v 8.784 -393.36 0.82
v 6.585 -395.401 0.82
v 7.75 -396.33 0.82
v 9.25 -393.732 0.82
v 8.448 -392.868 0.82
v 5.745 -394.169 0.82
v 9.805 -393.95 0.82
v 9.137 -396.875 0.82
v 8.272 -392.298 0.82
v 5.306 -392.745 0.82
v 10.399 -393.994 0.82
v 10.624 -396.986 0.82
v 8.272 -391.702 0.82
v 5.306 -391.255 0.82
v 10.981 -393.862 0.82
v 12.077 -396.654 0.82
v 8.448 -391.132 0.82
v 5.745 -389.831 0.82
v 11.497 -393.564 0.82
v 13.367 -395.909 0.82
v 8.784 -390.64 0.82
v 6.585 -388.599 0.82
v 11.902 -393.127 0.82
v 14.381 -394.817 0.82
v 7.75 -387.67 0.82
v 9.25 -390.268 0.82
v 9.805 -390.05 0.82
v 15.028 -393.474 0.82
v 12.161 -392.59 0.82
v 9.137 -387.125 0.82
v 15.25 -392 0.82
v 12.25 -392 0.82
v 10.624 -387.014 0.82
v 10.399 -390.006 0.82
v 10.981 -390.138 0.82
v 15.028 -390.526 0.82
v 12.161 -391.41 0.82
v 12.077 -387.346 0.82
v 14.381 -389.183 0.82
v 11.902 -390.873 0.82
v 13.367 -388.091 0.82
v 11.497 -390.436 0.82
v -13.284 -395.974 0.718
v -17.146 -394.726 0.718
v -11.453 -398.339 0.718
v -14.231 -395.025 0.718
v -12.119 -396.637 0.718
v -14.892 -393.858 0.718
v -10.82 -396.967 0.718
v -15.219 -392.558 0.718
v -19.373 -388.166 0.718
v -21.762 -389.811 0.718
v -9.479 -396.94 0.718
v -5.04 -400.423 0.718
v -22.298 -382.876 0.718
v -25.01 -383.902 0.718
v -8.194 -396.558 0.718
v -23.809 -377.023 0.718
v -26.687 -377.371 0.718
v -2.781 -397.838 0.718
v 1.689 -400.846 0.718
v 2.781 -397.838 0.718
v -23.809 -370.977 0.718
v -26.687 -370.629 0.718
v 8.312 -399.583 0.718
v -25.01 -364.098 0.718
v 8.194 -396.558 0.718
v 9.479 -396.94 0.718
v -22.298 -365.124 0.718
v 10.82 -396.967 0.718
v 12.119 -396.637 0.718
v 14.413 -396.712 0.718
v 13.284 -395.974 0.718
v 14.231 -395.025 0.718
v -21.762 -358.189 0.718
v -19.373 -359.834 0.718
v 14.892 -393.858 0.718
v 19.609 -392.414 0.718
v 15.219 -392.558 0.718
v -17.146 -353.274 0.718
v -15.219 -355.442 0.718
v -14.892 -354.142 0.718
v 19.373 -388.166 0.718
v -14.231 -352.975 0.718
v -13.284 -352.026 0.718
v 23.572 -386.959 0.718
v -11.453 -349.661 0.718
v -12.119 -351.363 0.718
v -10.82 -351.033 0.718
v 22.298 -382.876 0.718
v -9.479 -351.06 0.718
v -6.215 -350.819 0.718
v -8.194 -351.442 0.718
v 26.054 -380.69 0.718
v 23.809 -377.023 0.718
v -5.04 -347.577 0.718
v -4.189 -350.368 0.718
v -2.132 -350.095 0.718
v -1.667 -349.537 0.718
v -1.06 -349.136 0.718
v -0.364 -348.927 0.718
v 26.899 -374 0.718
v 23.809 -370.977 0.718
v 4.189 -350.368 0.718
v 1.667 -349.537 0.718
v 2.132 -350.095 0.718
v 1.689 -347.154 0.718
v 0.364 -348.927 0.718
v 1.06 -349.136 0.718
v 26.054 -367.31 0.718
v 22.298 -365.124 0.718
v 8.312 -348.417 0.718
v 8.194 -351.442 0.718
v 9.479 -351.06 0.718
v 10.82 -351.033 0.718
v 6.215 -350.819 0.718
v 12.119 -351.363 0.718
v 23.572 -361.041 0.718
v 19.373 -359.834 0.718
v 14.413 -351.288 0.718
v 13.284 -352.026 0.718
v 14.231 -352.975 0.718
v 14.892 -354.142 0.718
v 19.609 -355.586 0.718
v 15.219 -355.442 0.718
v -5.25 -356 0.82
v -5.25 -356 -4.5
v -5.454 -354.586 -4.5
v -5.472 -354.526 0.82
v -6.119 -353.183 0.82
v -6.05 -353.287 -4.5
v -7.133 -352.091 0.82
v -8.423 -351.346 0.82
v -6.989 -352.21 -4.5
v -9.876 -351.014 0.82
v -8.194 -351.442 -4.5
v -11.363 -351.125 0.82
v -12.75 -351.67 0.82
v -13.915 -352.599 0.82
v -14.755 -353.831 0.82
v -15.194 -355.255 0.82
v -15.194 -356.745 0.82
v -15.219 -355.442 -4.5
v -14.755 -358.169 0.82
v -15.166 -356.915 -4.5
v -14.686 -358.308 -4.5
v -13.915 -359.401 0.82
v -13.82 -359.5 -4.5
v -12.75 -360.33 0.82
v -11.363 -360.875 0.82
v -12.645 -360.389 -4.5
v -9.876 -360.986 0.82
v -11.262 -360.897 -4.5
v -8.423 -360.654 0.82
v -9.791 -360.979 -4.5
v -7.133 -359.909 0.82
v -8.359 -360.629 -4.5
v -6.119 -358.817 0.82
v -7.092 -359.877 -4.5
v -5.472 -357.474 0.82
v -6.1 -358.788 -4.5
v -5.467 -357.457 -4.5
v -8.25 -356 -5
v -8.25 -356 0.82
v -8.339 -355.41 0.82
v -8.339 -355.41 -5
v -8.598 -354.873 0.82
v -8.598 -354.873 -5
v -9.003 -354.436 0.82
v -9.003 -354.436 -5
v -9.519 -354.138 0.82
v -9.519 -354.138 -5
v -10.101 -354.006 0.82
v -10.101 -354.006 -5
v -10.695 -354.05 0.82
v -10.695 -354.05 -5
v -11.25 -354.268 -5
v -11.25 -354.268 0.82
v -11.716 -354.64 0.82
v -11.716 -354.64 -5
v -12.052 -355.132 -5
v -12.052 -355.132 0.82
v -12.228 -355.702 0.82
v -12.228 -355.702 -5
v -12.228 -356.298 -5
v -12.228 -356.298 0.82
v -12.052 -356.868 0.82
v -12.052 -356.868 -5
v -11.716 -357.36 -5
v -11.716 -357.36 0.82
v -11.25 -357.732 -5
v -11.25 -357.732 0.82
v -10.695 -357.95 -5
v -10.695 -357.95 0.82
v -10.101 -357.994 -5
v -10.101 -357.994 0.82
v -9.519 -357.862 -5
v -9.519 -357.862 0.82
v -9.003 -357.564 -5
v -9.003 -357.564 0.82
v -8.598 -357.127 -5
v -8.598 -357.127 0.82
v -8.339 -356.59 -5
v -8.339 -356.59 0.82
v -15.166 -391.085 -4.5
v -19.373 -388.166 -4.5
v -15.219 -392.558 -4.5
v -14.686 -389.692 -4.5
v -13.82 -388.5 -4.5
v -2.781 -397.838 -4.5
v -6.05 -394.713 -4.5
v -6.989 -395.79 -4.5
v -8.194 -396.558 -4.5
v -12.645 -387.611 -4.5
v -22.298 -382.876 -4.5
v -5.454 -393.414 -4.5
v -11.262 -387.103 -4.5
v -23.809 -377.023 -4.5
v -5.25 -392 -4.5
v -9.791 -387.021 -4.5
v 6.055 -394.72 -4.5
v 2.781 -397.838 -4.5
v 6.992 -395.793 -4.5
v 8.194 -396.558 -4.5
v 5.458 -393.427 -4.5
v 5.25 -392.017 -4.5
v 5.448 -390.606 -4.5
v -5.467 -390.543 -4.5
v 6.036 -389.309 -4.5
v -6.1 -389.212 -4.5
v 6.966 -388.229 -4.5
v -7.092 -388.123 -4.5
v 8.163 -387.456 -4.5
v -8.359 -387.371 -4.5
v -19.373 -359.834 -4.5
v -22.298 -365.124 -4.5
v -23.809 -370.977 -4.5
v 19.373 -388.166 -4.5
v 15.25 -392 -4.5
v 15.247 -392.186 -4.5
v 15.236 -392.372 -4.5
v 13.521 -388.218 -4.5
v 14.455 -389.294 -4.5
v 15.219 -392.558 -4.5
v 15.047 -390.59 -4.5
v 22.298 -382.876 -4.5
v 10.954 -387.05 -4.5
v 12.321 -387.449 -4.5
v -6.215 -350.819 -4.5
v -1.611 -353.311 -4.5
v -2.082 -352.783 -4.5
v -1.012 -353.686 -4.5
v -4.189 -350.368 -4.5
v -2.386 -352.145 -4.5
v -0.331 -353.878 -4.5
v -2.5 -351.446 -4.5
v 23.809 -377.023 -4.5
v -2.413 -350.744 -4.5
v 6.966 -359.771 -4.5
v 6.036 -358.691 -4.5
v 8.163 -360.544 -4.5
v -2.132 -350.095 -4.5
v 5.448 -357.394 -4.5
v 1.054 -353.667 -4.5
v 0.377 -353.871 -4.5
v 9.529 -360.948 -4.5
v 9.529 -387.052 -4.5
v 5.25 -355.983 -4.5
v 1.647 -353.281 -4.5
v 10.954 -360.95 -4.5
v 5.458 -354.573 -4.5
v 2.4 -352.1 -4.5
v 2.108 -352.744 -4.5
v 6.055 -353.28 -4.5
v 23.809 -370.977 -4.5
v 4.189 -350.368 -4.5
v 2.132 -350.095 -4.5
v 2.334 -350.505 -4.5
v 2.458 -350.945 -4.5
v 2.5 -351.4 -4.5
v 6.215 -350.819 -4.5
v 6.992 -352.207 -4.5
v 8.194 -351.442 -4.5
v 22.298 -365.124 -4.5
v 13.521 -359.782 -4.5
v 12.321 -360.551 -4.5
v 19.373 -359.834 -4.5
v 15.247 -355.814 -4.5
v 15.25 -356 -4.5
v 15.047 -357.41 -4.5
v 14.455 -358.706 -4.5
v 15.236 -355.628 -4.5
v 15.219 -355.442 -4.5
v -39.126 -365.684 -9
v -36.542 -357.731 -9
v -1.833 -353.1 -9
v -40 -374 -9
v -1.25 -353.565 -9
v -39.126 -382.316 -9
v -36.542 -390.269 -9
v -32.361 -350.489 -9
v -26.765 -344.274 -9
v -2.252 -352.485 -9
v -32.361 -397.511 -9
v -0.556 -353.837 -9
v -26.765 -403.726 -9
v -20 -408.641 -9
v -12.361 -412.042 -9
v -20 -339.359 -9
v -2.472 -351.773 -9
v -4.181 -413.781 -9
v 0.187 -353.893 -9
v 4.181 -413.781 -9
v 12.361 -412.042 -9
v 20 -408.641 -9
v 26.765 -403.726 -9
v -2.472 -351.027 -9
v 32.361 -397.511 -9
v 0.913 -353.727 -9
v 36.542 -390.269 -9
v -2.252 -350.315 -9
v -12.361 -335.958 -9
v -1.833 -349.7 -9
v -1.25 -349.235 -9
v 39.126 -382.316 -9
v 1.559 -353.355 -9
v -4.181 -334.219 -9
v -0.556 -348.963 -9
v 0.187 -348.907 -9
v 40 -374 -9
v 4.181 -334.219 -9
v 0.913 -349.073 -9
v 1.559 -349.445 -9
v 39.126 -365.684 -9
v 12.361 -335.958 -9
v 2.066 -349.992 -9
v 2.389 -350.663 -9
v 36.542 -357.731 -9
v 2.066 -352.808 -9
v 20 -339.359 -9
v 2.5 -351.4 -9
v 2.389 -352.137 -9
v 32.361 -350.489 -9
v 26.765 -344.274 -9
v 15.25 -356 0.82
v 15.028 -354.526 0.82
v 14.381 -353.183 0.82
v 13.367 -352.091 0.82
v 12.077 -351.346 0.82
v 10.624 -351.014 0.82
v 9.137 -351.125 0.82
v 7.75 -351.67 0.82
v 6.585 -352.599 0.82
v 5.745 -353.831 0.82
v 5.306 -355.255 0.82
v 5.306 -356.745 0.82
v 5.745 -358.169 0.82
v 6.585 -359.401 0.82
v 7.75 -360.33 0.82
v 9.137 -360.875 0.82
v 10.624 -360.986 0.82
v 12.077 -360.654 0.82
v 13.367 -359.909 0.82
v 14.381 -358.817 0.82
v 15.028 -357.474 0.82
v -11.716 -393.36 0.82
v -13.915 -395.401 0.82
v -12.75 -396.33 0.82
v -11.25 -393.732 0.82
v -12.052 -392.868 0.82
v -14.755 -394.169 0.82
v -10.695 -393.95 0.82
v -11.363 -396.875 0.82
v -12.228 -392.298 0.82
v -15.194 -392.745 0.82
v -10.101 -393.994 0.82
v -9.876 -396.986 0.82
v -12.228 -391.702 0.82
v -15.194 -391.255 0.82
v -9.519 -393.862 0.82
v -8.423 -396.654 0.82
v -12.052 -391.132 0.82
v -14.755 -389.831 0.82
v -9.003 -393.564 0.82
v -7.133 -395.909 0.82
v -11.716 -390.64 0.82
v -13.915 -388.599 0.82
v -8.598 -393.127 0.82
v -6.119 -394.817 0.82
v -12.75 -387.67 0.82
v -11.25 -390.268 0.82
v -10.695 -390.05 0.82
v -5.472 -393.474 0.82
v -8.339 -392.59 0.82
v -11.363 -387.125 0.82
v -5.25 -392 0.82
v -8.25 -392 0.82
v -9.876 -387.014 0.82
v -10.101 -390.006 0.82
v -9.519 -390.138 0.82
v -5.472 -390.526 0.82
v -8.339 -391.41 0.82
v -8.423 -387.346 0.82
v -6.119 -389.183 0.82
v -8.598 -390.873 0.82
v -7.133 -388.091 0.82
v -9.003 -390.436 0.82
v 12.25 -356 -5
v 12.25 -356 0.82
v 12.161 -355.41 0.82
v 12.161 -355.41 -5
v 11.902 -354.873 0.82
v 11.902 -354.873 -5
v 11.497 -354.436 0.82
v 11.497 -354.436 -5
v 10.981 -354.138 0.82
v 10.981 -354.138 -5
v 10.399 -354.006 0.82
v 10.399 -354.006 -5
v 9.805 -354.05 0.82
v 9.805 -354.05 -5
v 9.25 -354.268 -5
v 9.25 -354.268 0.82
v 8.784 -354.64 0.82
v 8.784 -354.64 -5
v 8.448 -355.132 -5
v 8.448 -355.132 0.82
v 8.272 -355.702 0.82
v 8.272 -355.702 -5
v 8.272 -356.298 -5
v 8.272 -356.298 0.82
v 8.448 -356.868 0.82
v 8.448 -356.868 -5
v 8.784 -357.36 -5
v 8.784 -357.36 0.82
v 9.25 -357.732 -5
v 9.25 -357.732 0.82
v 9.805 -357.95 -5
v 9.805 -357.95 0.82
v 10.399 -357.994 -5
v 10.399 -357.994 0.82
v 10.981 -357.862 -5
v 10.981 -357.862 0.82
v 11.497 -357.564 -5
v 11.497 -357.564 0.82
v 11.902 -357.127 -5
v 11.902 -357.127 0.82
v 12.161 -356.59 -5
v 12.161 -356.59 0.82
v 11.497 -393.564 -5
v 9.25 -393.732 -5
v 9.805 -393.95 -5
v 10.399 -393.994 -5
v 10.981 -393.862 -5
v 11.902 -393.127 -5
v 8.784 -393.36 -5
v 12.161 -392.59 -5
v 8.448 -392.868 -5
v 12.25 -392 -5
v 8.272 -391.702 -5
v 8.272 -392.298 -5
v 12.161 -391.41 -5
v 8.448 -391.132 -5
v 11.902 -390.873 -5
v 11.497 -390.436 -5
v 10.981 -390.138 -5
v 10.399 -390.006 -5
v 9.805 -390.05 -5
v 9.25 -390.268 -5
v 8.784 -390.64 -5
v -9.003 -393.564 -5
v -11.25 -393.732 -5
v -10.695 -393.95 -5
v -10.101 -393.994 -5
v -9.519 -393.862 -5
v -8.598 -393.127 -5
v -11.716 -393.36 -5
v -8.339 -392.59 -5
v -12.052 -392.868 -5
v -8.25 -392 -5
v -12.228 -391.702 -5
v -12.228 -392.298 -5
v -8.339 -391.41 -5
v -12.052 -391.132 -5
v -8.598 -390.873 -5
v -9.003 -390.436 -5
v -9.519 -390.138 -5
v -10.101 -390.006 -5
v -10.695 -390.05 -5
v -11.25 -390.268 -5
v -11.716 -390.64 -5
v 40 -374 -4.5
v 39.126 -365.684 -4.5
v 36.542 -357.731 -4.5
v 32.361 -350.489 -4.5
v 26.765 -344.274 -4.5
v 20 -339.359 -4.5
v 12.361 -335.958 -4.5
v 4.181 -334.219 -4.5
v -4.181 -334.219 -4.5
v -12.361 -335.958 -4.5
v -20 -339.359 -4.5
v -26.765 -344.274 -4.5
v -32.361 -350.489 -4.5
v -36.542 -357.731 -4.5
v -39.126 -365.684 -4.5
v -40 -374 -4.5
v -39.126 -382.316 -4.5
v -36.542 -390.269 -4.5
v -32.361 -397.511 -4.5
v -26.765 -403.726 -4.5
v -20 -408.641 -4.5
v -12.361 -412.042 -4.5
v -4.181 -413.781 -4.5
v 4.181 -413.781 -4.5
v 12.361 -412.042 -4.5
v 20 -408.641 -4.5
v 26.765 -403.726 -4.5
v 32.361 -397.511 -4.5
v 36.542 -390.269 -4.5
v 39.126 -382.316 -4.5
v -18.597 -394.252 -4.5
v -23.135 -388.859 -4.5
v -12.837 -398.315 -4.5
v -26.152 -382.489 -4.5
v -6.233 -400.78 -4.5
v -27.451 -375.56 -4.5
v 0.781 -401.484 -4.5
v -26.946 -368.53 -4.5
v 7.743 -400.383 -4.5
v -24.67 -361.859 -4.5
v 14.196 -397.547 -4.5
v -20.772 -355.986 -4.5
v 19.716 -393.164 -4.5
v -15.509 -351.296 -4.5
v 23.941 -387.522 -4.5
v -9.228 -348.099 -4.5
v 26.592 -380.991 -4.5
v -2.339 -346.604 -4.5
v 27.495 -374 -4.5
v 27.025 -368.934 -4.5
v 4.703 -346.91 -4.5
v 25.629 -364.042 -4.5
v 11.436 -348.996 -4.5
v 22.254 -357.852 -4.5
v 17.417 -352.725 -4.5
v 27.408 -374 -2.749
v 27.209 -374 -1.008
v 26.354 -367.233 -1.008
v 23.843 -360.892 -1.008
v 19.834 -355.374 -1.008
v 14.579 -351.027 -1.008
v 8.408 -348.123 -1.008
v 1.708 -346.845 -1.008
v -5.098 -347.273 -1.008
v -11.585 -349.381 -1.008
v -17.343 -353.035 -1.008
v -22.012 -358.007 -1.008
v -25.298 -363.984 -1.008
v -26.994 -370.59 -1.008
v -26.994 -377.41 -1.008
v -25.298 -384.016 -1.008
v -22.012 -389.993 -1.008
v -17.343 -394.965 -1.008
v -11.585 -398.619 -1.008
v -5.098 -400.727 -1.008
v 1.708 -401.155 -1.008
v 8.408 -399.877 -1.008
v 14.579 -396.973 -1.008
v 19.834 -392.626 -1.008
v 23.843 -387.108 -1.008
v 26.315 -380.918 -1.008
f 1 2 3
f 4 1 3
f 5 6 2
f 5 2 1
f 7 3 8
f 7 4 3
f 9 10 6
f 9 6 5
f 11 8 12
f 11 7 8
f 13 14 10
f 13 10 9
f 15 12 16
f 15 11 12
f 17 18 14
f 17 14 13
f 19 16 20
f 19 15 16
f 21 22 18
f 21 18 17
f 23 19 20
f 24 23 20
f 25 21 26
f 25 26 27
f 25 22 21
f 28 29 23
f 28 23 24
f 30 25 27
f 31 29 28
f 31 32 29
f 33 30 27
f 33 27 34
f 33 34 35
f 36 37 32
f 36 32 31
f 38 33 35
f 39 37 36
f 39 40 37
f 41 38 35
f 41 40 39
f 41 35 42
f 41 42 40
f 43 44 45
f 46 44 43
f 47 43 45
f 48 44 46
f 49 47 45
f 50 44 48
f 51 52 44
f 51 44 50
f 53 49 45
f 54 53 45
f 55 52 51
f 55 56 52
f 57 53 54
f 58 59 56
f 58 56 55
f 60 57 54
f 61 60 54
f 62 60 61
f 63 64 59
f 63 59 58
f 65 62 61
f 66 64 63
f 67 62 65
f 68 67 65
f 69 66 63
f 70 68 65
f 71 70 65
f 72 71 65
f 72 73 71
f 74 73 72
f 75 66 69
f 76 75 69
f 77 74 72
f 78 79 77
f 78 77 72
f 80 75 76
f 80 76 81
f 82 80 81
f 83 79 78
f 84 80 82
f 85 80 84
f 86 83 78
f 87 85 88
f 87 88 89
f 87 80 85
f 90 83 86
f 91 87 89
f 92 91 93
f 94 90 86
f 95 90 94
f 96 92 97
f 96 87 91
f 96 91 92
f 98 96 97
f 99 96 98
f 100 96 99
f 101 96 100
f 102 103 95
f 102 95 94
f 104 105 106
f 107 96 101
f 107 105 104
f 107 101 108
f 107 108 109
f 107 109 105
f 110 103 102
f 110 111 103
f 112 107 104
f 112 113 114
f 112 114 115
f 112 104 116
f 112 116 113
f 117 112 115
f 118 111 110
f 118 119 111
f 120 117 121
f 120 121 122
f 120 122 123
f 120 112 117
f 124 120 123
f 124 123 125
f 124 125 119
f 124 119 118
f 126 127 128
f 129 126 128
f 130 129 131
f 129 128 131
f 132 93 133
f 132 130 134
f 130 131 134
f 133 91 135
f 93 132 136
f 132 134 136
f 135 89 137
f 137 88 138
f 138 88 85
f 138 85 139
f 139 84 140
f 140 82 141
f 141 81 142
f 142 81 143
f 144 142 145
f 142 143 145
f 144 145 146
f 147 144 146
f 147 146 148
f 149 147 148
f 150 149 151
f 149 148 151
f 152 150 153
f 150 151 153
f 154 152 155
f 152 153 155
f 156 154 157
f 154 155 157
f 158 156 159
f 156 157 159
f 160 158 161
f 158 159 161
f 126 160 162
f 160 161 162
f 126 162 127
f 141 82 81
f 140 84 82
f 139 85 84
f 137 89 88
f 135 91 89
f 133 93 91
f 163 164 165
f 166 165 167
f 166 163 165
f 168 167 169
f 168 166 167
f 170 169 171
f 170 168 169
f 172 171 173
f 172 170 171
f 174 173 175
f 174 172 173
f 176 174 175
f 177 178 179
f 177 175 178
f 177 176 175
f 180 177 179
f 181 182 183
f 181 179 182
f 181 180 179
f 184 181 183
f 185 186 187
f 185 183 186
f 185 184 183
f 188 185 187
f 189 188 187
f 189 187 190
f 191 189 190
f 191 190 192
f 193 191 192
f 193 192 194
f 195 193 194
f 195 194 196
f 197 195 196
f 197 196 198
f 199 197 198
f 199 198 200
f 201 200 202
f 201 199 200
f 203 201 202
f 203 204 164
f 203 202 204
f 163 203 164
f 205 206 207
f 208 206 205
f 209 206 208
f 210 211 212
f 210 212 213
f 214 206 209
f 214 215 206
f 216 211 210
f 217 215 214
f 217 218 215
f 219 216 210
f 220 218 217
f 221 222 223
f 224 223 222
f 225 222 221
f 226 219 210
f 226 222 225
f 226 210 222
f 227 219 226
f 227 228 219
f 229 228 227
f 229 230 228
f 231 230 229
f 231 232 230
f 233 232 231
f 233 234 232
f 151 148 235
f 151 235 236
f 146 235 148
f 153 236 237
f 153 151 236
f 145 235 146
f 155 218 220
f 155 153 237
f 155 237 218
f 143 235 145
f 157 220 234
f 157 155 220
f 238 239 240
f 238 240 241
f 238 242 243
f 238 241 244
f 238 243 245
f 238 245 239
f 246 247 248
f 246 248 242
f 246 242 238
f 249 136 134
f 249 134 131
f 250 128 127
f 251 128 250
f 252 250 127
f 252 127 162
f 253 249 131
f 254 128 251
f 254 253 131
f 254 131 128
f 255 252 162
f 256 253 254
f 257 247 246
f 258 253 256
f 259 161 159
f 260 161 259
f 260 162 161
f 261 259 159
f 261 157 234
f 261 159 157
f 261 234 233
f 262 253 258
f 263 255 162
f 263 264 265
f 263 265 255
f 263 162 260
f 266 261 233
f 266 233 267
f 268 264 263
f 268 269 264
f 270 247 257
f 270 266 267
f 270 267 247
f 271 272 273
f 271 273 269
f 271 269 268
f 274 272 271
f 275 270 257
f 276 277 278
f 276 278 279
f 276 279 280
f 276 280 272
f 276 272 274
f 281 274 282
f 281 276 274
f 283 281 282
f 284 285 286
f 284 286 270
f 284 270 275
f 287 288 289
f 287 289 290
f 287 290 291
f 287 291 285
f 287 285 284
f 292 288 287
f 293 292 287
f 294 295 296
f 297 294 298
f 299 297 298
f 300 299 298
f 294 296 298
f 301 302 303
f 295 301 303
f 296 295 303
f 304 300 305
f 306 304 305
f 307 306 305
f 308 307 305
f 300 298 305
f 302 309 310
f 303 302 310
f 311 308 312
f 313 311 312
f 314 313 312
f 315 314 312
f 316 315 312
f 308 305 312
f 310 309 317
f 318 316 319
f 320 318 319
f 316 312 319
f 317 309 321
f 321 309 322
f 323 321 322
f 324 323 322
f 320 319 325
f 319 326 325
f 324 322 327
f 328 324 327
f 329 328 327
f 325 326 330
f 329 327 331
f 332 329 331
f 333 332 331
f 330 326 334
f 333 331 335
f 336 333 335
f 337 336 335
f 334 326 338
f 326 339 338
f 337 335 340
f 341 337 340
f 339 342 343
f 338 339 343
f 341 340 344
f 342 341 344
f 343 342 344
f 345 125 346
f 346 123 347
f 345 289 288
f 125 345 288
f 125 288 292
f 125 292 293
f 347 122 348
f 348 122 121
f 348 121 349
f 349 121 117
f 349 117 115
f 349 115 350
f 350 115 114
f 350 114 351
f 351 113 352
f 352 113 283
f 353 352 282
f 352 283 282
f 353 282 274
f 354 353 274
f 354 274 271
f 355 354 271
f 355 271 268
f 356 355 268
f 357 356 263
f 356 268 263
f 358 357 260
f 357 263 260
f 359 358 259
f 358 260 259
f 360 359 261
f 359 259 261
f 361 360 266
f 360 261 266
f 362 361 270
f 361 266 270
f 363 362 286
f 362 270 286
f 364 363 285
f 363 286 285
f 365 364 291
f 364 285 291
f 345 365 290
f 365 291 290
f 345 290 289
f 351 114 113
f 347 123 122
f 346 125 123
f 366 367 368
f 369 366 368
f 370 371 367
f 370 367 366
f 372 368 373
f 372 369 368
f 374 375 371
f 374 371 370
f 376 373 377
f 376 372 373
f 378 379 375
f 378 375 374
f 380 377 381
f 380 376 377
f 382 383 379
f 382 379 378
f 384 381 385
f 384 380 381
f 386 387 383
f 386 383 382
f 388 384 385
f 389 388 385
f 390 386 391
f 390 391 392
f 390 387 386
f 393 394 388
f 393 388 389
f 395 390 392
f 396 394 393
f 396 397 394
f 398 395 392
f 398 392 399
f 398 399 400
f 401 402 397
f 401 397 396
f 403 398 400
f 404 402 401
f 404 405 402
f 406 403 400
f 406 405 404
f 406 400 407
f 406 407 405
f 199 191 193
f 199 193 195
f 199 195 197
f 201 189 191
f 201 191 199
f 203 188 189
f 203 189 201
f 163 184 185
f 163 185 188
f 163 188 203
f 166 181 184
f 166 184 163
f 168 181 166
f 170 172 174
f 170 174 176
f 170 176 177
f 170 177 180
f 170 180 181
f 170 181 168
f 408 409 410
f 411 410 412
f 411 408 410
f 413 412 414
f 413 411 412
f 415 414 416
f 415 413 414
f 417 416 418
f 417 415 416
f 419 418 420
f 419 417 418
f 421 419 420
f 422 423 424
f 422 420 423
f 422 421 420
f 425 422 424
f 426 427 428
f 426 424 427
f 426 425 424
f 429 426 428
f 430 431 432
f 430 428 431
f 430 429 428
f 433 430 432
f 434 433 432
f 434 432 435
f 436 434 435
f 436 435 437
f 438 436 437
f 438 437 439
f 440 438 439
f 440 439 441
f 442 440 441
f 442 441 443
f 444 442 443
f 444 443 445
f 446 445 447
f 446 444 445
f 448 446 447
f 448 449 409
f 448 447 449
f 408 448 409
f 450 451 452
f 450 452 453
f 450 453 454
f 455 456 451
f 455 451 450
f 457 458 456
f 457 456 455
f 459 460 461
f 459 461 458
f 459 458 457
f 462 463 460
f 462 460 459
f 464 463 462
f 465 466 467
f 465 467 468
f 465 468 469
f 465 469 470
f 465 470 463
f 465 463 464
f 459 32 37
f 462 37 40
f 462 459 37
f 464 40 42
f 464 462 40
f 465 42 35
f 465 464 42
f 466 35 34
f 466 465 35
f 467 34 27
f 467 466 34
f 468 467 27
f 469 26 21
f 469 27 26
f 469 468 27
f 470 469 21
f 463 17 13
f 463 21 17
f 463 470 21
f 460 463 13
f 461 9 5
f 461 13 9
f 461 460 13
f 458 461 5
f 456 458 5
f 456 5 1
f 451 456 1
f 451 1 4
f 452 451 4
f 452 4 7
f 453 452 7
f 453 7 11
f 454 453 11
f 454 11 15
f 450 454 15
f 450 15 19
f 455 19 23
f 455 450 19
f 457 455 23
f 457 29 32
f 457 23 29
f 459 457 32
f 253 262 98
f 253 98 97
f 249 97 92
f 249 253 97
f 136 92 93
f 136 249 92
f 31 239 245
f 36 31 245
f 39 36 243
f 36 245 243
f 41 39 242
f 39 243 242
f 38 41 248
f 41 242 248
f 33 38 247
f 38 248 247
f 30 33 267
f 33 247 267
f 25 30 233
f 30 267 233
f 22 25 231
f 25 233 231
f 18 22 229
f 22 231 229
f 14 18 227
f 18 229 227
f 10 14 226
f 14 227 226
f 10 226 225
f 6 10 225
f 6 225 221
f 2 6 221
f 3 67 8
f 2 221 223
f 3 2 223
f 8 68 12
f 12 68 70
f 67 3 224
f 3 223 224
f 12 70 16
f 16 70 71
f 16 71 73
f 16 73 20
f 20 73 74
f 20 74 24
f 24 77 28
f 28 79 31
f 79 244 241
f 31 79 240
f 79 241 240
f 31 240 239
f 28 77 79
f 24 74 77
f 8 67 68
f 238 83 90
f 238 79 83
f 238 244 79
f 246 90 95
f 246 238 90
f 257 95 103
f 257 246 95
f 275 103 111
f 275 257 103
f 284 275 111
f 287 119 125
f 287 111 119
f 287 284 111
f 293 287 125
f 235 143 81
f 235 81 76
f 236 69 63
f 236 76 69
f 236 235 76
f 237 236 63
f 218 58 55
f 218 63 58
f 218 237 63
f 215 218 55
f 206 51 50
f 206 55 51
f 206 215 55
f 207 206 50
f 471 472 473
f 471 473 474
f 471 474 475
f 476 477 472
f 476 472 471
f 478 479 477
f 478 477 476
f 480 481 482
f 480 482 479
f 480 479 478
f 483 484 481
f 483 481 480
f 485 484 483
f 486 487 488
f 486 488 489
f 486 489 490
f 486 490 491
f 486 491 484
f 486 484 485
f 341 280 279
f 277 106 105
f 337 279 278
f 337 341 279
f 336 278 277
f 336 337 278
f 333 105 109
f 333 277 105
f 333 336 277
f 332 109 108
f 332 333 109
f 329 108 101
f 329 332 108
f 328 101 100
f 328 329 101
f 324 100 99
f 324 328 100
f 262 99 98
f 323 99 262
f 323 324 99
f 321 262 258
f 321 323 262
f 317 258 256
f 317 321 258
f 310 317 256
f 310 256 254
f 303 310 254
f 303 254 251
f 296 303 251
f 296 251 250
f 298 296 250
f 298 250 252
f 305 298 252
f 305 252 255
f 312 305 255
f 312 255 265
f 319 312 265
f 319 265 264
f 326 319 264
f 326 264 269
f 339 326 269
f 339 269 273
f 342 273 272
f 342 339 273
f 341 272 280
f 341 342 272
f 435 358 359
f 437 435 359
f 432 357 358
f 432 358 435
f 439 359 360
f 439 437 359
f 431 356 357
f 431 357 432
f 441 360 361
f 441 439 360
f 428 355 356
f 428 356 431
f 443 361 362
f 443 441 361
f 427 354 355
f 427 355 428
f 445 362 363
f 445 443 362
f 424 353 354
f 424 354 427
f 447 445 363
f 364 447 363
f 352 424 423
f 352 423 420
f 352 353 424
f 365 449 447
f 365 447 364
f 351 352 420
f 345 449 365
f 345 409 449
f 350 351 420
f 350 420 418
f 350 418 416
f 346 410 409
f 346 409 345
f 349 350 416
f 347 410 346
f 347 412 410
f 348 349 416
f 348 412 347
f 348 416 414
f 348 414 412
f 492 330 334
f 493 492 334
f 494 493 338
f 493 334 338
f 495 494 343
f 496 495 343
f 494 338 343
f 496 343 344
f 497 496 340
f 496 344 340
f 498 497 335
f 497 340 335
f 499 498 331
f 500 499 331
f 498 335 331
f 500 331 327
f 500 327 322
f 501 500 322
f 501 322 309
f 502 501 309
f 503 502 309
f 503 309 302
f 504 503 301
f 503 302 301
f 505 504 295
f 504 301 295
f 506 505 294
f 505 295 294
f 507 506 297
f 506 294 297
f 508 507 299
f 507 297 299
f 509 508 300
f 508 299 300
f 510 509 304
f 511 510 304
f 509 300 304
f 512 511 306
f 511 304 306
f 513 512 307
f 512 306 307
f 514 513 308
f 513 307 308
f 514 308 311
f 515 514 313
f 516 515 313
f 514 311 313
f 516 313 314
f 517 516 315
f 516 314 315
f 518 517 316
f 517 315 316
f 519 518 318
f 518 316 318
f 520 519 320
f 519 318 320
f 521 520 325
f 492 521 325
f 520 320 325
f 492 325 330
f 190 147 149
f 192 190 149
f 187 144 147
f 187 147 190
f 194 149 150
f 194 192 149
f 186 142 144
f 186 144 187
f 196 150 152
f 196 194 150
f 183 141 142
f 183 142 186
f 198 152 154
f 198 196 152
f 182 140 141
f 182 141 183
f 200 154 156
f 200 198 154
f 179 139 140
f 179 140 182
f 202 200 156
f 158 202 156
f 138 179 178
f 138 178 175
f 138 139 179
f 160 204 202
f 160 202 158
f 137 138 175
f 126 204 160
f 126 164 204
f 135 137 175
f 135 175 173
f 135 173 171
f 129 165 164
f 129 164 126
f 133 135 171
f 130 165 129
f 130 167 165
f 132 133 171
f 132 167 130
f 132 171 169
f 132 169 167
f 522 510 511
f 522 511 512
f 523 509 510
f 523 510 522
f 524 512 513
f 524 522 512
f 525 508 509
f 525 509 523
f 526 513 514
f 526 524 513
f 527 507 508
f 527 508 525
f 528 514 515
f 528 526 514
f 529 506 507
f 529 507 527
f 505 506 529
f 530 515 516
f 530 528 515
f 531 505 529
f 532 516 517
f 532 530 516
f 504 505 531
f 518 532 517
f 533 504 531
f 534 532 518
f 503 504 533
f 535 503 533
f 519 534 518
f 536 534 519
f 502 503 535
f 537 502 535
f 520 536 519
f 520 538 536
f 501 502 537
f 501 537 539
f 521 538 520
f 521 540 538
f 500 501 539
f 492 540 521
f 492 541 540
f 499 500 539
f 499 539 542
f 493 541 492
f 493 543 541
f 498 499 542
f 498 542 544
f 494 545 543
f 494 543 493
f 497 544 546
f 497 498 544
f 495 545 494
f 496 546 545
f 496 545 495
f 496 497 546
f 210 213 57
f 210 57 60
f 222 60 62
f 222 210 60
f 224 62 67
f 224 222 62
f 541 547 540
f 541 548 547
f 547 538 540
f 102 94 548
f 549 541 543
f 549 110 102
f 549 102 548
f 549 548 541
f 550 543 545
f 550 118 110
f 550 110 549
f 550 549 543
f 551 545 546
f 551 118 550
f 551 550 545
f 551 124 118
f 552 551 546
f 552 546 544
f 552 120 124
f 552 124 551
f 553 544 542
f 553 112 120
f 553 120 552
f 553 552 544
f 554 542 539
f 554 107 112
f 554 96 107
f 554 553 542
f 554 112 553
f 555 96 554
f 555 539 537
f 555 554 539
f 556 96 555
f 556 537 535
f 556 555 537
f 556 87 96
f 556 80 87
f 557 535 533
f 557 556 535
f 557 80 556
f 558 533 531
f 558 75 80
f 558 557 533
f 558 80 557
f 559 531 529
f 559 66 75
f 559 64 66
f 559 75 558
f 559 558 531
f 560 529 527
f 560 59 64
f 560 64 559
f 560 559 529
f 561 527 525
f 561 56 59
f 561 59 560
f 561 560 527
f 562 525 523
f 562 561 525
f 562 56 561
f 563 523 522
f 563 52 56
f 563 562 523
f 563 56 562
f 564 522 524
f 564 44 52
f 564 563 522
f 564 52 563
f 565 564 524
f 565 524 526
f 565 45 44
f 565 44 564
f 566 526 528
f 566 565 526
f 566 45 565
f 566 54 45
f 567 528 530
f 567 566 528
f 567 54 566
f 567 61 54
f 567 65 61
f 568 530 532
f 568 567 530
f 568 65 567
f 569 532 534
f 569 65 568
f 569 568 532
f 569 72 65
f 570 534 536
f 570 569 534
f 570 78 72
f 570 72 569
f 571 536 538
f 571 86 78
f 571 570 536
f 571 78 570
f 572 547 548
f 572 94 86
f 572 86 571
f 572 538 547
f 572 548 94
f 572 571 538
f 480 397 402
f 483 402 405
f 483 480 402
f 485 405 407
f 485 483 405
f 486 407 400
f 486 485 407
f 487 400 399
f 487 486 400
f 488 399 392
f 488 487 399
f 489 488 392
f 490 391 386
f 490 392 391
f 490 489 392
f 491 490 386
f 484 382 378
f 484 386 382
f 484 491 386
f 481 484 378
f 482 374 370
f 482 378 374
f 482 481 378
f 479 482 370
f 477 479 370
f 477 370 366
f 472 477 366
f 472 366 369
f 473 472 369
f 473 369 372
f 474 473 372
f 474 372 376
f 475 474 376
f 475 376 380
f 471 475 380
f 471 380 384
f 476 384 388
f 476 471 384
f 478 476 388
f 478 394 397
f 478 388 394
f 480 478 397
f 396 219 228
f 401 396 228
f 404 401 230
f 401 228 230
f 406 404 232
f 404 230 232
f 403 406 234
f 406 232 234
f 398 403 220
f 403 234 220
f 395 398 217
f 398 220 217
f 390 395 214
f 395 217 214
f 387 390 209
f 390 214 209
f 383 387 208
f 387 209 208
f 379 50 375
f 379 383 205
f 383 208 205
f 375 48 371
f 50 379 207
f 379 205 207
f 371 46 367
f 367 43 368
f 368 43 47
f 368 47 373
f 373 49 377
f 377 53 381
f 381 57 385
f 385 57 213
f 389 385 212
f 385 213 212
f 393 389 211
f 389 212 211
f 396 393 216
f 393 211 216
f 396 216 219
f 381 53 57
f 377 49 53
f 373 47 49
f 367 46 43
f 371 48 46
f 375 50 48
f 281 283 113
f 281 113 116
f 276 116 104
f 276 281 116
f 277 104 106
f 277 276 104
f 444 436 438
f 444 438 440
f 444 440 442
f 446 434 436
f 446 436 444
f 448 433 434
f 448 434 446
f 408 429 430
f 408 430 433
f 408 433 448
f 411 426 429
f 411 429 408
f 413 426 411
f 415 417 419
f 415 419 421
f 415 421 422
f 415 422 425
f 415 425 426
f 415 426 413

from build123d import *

# Parameters (mm, degrees)
CYLINDER165_R     = 2.5
CYLINDER165_DEPTH = 60
CYLINDER161_R     = 2
CYLINDER161_DEPTH = 10
CYLINDER162_R     = 2
CYLINDER162_DEPTH = 10
CYLINDER163_R     = 2
CYLINDER163_DEPTH = 10
CYLINDER164_R     = 2
CYLINDER164_DEPTH = 10
CYLINDER156_R     = 5.5
CYLINDER156_DEPTH = 1
CYLINDER157_R     = 5
CYLINDER157_DEPTH = 5.82
CYLINDER158_R     = 5
CYLINDER158_DEPTH = 5.82
CYLINDER159_R     = 5
CYLINDER159_DEPTH = 5.82
CYLINDER160_R     = 5
CYLINDER160_DEPTH = 5.82
CYLINDER154_R     = 40
CYLINDER154_DEPTH = 4.5
CYLINDER155_R     = 24
CYLINDER155_DEPTH = 7


with BuildPart() as wirecut004:
    # Cylinder165 → Cylinder165 (new body)
    with BuildSketch(Plane(origin=(134, 32.6, 20), x_dir=(1, 0, 0), z_dir=(0, 0, 1))):
        Circle(CYLINDER165_R)
    extrude(amount=CYLINDER165_DEPTH)


with BuildPart() as cylinder161:
    # Cylinder161 → Cylinder161 (new body)
    with BuildSketch(Plane(origin=(0, -21, 0), x_dir=(1, 0, 0), z_dir=(0, 0, 1))):
        Circle(CYLINDER161_R)
    extrude(amount=CYLINDER161_DEPTH)


with BuildPart() as m3heatsetcuts025:
    # Cylinder162 → Cylinder162 (new body)
    with BuildSketch(Plane(origin=(20.5, -21, 0), x_dir=(1, 0, 0), z_dir=(0, 0, 1))):
        Circle(CYLINDER162_R)
    extrude(amount=CYLINDER162_DEPTH)

    # Fusion103: union Cylinder161
    add(cylinder161.part)


with BuildPart() as m3heatsetcuts025_1:
    # Fusion103 placement: moved
    add(m3heatsetcuts025.part.moved(Location((-5, 39, 70))))


with BuildPart() as cylinder163:
    # Cylinder163 → Cylinder163 (new body)
    with BuildSketch(Plane(origin=(0, -21, 0), x_dir=(1, 0, 0), z_dir=(0, 0, 1))):
        Circle(CYLINDER163_R)
    extrude(amount=CYLINDER163_DEPTH)


with BuildPart() as lightmodulecut005:
    # Cylinder164 → Cylinder164 (new body)
    with BuildSketch(Plane(origin=(20.5, -21, 0), x_dir=(1, 0, 0), z_dir=(0, 0, 1))):
        Circle(CYLINDER164_R)
    extrude(amount=CYLINDER164_DEPTH)

    # Fusion104: union Cylinder163
    add(cylinder163.part)


with BuildPart() as lightmodulecut005_1:
    # Fusion104 placement: moved
    add(lightmodulecut005.part.moved(Location((-5, 3, 70))))

    # Fusion102: union m3HeatSetCuts025
    add(m3heatsetcuts025_1.part)


with BuildPart() as lightmodulecut005_2:
    # Fusion102 placement: moved
    add(lightmodulecut005_1.part.moved(Location((128.75, 10, -1))))

    # Fusion105: union WireCut004
    add(wirecut004.part)


with BuildPart() as cylinder156:
    # Cylinder156 → Cylinder156 (new body)
    with BuildSketch(Plane(origin=(134, 32.6, 65), x_dir=(1, 0, 0), z_dir=(0, 0, 1))):
        Circle(CYLINDER156_R)
    extrude(amount=CYLINDER156_DEPTH)


with BuildPart() as cylinder157:
    # Cylinder157 → Cylinder157 (new body)
    with BuildSketch(Plane(origin=(0, -21, 0), x_dir=(1, 0, 0), z_dir=(0, 0, 1))):
        Circle(CYLINDER157_R)
    extrude(amount=CYLINDER157_DEPTH)


with BuildPart() as m3heatsetcuts021:
    # Cylinder158 → Cylinder158 (new body)
    with BuildSketch(Plane(origin=(20.5, -21, 0), x_dir=(1, 0, 0), z_dir=(0, 0, 1))):
        Circle(CYLINDER158_R)
    extrude(amount=CYLINDER158_DEPTH)

    # Fusion097: union Cylinder157
    add(cylinder157.part)


with BuildPart() as m3heatsetcuts021_1:
    # Fusion097 placement: moved
    add(m3heatsetcuts021.part.moved(Location((-5, 39, 70))))


with BuildPart() as cylinder159:
    # Cylinder159 → Cylinder159 (new body)
    with BuildSketch(Plane(origin=(0, -21, 0), x_dir=(1, 0, 0), z_dir=(0, 0, 1))):
        Circle(CYLINDER159_R)
    extrude(amount=CYLINDER159_DEPTH)


with BuildPart() as m3heatsetcuts023:
    # Cylinder160 → Cylinder160 (new body)
    with BuildSketch(Plane(origin=(20.5, -21, 0), x_dir=(1, 0, 0), z_dir=(0, 0, 1))):
        Circle(CYLINDER160_R)
    extrude(amount=CYLINDER160_DEPTH)

    # Fusion098: union Cylinder159
    add(cylinder159.part)


with BuildPart() as m3heatsetcuts023_1:
    # Fusion098 placement: moved
    add(m3heatsetcuts023.part.moved(Location((-5, 3, 70))))

    # Fusion099: union m3HeatSetCuts021
    add(m3heatsetcuts021_1.part)


with BuildPart() as m3heatsetcuts023_2:
    # Fusion099 placement: moved
    add(m3heatsetcuts023_1.part.moved(Location((128.75, 10, -1))))


with BuildPart() as base014:
    # Cylinder154 → Cylinder154 (new body)
    with BuildSketch(Plane(origin=(136, 0, 65), x_dir=(1, 0, 0), z_dir=(0, 0, 1))):
        Circle(CYLINDER154_R)
    extrude(amount=CYLINDER154_DEPTH)


with BuildPart() as basecut003:
    # Cylinder155 → Cylinder155 (new body)
    with BuildSketch(Plane(origin=(5, 0, 74), x_dir=(1, 0, 0), z_dir=(0, 0, 1))):
        Circle(CYLINDER155_R)
    extrude(amount=CYLINDER155_DEPTH)


with BuildPart() as lightmodule009:
    # Sphere005 → Sphere005 (revolve)
    with BuildSketch(Plane(origin=(5, 0, 74), x_dir=(1, 0, 0), z_dir=(0, -1, 0))):
        with BuildLine():
            ThreePointArc((27.5, 0), (27.349352, 2.874533), (26.899059, 5.717571))
            Line((26.899059, 5.717571), (0, 5.717571))
            Line((0, 5.717571), (0, 0))
            Line((0, 0), (27.5, 0))
        make_face()
    revolve(axis=Axis((5, 0, 74), (0, 0, 1)))

    # Cut053: cut baseCut003
    add(basecut003.part, mode=Mode.SUBTRACT)


with BuildPart() as lightmodule009_1:
    # Cut053 placement: moved
    add(lightmodule009.part.moved(Location((131, 0, -5))))

    # Fusion100: union base014
    add(base014.part)


with BuildPart() as lightmodule009_2:
    # Fusion100 placement: moved
    add(lightmodule009_1.part.moved(Location((-2, 10, 0))))

    # Fusion101: union Cylinder156, m3HeatSetCuts023
    add(cylinder156.part)
    add(m3heatsetcuts023_2.part)

    # Cut054: cut lightModuleCut005
    add(lightmodulecut005_2.part, mode=Mode.SUBTRACT)


with BuildPart() as lightmodule009_3:
    # Cut054 placement: moved
    add(lightmodule009_2.part.moved(Location((-134, -384, -74))))


solid = lightmodule009_3.part
